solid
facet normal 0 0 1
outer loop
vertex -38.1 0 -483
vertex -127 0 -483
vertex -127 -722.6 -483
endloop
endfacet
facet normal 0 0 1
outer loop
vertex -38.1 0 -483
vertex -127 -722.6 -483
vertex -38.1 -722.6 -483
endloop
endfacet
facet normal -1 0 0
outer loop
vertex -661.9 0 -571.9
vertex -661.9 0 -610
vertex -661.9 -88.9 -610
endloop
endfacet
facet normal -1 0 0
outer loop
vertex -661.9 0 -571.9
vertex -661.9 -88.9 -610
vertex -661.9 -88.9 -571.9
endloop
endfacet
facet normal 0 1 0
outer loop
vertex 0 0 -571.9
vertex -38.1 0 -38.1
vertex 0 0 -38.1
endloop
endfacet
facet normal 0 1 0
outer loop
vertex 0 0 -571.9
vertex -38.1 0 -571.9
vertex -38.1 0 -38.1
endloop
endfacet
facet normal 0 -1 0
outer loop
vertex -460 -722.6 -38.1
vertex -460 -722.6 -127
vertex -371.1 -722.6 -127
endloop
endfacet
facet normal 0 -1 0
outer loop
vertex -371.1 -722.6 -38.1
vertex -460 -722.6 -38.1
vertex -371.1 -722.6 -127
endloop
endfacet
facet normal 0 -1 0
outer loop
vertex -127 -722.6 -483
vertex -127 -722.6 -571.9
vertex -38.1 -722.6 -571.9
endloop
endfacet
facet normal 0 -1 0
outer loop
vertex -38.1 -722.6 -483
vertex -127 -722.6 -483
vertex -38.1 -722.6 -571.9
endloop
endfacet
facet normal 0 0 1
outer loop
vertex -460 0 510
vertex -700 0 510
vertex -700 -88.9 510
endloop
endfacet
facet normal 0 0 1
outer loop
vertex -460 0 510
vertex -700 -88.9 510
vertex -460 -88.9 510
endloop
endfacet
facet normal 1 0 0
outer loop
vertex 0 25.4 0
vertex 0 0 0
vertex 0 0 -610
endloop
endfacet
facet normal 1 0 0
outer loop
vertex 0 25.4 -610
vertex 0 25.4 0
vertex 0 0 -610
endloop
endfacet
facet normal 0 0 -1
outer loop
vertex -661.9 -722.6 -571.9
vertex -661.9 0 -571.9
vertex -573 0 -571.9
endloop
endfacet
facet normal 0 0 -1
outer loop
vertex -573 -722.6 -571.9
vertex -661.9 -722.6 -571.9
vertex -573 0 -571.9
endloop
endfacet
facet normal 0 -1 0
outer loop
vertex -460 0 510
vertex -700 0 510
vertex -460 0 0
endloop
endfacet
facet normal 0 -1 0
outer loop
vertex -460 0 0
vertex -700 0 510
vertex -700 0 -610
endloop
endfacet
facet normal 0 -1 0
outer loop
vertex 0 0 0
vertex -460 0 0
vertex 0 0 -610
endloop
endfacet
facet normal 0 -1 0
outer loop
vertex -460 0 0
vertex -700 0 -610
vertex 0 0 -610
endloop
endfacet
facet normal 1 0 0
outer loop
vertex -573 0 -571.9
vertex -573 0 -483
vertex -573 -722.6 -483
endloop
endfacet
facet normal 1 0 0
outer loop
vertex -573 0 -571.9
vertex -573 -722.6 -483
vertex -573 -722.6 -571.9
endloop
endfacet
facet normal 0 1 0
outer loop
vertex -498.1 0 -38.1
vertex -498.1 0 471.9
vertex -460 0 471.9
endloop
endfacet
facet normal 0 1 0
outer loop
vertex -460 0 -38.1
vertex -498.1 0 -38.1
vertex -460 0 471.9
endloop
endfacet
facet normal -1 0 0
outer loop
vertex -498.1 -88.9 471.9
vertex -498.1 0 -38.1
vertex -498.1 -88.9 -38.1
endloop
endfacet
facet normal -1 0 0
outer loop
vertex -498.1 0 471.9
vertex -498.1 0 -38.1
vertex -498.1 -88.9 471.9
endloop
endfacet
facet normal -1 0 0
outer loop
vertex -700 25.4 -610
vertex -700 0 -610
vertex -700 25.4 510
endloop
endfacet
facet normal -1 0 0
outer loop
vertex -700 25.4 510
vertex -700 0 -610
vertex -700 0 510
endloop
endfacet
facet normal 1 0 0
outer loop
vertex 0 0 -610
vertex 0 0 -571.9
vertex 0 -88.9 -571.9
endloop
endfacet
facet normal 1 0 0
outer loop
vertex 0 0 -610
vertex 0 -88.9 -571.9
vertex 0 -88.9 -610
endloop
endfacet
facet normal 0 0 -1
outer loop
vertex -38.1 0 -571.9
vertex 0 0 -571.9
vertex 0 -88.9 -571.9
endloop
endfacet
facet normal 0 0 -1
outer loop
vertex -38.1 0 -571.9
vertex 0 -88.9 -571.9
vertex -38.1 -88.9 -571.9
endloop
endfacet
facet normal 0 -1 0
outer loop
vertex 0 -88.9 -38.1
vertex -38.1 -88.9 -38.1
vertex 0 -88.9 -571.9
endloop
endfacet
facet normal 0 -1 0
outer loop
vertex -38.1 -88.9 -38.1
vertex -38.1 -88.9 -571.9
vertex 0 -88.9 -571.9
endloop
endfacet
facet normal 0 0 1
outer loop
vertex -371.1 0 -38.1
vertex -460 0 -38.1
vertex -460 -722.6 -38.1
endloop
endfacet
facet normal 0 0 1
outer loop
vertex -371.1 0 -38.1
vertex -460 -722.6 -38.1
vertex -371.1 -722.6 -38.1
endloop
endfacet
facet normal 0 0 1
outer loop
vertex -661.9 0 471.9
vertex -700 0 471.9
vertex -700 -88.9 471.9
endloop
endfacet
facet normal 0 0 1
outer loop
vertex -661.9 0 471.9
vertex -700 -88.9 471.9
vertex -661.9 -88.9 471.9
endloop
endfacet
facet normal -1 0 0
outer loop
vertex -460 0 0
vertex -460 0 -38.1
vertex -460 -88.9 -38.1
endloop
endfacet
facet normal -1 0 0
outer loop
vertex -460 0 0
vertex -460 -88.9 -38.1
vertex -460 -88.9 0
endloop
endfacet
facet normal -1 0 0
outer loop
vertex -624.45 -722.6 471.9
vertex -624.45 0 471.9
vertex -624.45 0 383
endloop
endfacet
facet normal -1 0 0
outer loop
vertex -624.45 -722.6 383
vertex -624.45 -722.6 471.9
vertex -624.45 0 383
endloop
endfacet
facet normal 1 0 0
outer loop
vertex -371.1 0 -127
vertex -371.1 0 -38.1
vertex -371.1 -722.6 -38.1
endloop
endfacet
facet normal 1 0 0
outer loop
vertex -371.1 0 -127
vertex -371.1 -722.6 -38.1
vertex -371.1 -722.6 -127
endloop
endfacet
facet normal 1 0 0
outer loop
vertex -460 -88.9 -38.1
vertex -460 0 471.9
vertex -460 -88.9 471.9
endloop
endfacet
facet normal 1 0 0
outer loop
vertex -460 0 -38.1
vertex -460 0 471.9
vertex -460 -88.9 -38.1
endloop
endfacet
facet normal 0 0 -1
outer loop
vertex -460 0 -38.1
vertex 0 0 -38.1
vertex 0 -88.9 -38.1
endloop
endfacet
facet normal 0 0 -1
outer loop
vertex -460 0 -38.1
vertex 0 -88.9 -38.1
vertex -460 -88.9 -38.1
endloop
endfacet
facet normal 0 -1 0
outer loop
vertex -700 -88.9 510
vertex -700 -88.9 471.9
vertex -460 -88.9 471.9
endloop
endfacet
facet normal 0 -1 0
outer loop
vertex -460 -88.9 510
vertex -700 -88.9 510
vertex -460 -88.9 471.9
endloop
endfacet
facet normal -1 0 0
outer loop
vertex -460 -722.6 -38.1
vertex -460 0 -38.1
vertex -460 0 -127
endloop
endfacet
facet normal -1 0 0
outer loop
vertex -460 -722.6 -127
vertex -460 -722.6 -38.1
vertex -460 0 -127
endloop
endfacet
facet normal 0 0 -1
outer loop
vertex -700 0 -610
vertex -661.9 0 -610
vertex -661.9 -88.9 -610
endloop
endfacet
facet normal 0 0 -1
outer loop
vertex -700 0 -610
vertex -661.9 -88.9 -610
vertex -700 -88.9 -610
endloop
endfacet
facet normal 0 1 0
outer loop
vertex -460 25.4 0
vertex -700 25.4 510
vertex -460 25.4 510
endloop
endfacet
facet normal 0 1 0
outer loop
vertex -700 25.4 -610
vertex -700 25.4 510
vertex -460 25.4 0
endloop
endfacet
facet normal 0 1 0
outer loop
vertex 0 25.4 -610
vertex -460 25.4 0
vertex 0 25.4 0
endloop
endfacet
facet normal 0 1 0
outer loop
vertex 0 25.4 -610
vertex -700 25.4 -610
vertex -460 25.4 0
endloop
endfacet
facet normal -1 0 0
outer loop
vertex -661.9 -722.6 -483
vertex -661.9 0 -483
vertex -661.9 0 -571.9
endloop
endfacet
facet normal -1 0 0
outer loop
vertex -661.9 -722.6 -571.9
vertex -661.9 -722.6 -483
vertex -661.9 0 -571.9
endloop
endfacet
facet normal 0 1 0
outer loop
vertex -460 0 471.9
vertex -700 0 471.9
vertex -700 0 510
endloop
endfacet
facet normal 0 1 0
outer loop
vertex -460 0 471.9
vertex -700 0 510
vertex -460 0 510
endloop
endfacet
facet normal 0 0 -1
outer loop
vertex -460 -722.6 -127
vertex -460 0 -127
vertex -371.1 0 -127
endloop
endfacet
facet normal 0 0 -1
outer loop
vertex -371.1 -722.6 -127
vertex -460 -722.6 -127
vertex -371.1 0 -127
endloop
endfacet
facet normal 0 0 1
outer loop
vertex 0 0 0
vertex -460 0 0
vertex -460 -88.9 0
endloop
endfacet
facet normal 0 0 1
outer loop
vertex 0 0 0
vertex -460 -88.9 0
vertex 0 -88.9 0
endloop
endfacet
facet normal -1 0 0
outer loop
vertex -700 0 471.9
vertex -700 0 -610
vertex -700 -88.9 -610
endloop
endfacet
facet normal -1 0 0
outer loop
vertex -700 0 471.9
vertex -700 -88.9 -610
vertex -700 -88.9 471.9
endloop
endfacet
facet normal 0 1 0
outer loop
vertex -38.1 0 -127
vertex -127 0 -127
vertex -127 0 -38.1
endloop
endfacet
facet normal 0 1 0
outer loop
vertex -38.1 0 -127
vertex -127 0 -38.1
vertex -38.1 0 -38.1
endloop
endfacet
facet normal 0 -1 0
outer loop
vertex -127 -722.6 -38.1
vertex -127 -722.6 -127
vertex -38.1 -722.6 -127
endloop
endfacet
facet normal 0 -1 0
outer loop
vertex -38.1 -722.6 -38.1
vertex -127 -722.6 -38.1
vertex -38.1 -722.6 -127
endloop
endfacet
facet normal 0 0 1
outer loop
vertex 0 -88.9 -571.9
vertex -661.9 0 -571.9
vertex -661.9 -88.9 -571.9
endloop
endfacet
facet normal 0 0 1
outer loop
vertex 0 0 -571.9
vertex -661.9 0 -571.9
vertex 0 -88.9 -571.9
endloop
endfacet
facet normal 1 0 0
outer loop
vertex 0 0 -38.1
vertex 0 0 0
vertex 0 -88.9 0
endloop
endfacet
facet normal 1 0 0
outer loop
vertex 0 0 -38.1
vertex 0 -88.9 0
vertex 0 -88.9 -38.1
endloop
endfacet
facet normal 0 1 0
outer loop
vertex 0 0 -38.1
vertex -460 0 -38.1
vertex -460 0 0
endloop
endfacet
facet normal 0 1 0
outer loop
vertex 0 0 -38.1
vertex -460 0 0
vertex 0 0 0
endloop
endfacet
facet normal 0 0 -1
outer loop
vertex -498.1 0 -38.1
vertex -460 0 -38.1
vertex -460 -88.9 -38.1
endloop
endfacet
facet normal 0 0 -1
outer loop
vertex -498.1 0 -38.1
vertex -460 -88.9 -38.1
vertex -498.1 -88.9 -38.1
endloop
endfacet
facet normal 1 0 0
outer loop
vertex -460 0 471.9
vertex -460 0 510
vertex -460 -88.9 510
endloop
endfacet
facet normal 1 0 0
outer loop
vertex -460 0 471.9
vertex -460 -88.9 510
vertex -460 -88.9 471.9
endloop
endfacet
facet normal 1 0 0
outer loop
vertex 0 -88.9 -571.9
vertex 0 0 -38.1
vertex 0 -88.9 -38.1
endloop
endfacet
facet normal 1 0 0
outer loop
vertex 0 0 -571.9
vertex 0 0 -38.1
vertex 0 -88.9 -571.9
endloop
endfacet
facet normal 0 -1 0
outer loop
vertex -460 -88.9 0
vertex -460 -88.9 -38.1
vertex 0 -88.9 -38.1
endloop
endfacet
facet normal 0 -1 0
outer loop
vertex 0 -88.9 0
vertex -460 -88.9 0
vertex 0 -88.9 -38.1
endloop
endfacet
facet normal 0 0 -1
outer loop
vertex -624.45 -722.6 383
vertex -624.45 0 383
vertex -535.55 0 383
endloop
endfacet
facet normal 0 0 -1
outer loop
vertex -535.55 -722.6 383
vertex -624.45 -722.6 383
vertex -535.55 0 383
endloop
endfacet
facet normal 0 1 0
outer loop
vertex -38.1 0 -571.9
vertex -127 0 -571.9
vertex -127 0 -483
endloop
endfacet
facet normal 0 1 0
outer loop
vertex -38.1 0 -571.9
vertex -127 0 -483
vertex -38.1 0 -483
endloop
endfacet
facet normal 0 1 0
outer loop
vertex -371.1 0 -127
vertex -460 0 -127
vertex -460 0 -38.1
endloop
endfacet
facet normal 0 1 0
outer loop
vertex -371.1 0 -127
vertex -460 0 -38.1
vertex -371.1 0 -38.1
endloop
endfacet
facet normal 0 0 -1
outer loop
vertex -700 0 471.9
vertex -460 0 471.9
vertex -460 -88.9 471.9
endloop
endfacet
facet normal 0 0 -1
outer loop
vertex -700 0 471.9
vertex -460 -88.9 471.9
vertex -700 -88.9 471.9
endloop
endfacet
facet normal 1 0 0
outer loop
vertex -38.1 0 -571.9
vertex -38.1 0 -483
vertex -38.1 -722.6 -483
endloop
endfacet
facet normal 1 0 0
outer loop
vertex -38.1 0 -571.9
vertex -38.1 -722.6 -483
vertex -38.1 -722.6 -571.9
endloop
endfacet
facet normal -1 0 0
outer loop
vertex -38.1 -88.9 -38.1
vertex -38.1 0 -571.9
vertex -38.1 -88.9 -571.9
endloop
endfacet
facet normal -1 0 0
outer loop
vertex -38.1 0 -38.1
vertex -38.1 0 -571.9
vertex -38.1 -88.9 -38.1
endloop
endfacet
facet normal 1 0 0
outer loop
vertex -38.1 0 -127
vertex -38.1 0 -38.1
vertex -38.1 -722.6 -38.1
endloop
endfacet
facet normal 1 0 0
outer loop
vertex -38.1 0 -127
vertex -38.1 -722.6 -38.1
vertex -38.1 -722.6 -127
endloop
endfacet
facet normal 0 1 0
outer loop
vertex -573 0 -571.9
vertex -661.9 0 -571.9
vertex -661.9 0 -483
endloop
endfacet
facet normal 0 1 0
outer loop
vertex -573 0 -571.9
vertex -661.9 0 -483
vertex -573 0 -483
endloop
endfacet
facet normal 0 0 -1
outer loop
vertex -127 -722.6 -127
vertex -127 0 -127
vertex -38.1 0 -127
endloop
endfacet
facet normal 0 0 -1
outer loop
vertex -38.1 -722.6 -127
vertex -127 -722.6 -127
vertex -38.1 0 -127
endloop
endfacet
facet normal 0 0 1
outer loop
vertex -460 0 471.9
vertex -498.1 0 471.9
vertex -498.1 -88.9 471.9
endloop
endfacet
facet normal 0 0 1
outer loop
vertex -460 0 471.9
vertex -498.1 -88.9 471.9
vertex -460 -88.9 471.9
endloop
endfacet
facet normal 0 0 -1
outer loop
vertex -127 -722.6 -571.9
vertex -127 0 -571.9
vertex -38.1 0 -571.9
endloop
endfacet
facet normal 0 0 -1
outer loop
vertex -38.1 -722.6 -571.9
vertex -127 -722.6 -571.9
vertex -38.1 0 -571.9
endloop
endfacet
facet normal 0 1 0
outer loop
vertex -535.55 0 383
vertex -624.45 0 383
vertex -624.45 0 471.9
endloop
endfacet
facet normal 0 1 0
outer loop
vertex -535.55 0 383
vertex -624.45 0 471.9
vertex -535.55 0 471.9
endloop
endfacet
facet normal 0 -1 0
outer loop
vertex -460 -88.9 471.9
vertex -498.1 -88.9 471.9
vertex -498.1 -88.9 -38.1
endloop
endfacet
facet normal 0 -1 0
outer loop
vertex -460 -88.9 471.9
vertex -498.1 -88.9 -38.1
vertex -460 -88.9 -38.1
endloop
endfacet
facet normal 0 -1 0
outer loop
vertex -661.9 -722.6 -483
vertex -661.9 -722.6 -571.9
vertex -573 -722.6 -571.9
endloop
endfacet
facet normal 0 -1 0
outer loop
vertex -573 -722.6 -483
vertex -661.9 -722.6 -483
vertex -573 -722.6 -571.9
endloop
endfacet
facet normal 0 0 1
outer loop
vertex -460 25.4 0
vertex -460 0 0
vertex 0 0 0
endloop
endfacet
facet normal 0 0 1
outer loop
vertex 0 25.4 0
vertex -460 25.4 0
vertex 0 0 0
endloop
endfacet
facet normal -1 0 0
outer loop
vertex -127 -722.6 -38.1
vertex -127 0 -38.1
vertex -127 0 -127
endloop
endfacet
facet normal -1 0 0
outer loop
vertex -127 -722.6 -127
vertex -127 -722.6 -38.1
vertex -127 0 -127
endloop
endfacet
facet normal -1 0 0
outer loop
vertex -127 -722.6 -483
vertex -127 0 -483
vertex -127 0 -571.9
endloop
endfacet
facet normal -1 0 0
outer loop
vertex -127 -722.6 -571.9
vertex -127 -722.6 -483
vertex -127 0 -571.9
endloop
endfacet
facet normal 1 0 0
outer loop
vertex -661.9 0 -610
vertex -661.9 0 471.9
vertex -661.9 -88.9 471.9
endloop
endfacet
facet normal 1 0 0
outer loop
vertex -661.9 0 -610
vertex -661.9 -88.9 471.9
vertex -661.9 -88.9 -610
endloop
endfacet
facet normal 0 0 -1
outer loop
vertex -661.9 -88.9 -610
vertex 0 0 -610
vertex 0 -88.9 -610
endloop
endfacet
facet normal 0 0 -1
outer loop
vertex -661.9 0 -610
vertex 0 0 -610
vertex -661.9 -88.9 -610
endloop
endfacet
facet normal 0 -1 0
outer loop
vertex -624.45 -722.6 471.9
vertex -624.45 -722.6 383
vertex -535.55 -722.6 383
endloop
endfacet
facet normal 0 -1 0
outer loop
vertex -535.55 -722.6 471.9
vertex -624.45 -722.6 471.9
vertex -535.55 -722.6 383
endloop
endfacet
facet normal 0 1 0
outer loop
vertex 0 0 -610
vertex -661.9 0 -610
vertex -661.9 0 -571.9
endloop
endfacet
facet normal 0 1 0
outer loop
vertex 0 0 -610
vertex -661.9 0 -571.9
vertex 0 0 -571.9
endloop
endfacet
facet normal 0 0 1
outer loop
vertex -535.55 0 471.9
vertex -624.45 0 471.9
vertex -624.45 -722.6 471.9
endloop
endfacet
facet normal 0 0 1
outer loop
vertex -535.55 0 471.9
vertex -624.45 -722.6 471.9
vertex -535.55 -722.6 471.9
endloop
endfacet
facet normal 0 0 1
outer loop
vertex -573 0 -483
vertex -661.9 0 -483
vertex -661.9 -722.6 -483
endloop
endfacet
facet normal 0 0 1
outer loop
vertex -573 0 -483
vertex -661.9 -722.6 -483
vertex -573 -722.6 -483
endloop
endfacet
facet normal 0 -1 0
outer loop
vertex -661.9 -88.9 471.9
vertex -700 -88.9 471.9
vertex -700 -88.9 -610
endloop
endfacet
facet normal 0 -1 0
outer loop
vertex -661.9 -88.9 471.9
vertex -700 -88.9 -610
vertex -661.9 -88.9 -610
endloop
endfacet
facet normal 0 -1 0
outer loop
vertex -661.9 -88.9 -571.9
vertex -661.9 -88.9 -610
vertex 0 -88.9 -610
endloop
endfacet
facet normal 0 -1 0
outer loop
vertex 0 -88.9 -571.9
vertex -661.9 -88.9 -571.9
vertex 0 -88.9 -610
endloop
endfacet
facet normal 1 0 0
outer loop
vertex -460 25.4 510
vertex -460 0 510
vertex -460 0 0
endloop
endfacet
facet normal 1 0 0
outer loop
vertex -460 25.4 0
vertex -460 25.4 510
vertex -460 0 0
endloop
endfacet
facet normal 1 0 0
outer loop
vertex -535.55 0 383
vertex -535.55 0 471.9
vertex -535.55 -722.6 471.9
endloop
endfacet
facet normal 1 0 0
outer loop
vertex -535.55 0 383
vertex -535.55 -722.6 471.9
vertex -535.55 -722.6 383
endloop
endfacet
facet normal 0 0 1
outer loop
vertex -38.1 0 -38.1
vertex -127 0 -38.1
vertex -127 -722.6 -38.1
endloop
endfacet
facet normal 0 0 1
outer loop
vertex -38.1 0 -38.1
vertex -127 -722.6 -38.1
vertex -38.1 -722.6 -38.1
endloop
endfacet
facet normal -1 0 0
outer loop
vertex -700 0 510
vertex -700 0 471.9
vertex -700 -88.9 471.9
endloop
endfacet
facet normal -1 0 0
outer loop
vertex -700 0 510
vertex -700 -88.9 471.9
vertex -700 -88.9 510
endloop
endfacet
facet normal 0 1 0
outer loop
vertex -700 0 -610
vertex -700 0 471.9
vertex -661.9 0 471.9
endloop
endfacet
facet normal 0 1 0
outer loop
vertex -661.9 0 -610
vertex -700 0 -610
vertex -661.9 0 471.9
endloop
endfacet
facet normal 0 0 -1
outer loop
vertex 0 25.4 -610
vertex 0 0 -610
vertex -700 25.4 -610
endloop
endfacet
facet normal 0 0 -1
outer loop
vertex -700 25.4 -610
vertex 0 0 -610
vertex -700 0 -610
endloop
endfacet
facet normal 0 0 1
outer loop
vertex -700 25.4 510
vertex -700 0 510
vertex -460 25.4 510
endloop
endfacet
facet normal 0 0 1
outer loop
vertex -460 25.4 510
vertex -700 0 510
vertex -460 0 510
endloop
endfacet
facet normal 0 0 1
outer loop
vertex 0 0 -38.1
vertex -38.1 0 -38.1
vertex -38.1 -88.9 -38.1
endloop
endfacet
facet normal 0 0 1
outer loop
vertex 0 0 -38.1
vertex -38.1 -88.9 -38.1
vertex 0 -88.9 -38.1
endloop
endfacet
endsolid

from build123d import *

# Parameters (mm, degrees)
BOSS_EXTRUDE1_DEPTH   = 25.4
SKETCH1_3_W           = 88.9
SKETCH1_3_H           = 88.9
BOSS_EXTRUDE2_DEPTH   = 722.6
BOSS_EXTRUDE2_2_DEPTH = 722.6
BOSS_EXTRUDE2_3_DEPTH = 722.6
BOSS_EXTRUDE2_4_DEPTH = 722.6
BOSS_EXTRUDE2_5_DEPTH = 722.6
BOSS_EXTRUDE3_DEPTH   = 88.9
BOSS_EXTRUDE4_DEPTH   = 88.9
BOSS_EXTRUDE6_DEPTH   = 88.9
BOSS_EXTRUDE7_DEPTH   = 88.9
BOSS_EXTRUDE8_DEPTH   = 88.9
BOSS_EXTRUDE9_DEPTH   = 88.9


with BuildPart() as part:
    # Sketch1 → Boss-Extrude1 (new body)
    with BuildSketch(Plane(origin=(0, 0, 0), x_dir=(1, 0, 0), z_dir=(0, 1, 0))):
        Polygon((-700, -510), (-460, -510), (-460, 0), (0, 0), (0, 610), (-700, 610), align=None)
    extrude(amount=BOSS_EXTRUDE1_DEPTH)


with BuildPart() as body_2:
    # Sketch1<3> → Boss-Extrude2 (new body)
    with BuildSketch(Plane(origin=(0, 0, 0), x_dir=(1, 0, 0), z_dir=(0, 1, 0))):
        with Locations((-580, -427.45)):
            Rectangle(SKETCH1_3_W, SKETCH1_3_H)
    extrude(amount=-BOSS_EXTRUDE2_DEPTH)


with BuildPart() as body_3:
    # Sketch1<3> → Boss-Extrude2 2 (new body)
    with BuildSketch(Plane(origin=(0, 0, 0), x_dir=(1, 0, 0), z_dir=(0, 1, 0))):
        with Locations((-415.55, 82.55)):
            Rectangle(SKETCH1_3_W, SKETCH1_3_H)
    extrude(amount=-BOSS_EXTRUDE2_2_DEPTH)


with BuildPart() as body_4:
    # Sketch1<3> → Boss-Extrude2 3 (new body)
    with BuildSketch(Plane(origin=(0, 0, 0), x_dir=(1, 0, 0), z_dir=(0, 1, 0))):
        with Locations((-82.55, 82.55)):
            Rectangle(SKETCH1_3_W, SKETCH1_3_H)
    extrude(amount=-BOSS_EXTRUDE2_3_DEPTH)


with BuildPart() as body_5:
    # Sketch1<3> → Boss-Extrude2 4 (new body)
    with BuildSketch(Plane(origin=(0, 0, 0), x_dir=(1, 0, 0), z_dir=(0, 1, 0))):
        with Locations((-82.55, 527.45)):
            Rectangle(SKETCH1_3_W, SKETCH1_3_H)
    extrude(amount=-BOSS_EXTRUDE2_4_DEPTH)


with BuildPart() as body_6:
    # Sketch1<3> → Boss-Extrude2 5 (new body)
    with BuildSketch(Plane(origin=(0, 0, 0), x_dir=(1, 0, 0), z_dir=(0, 1, 0))):
        with Locations((-617.45, 527.45)):
            Rectangle(SKETCH1_3_W, SKETCH1_3_H)
    extrude(amount=-BOSS_EXTRUDE2_5_DEPTH)


with BuildPart() as body_7:
    # Sketch1<4> → Boss-Extrude3 (new body)
    with BuildSketch(Plane(origin=(0, 0, 0), x_dir=(1, 0, 0), z_dir=(0, 1, 0))):
        Polygon((-460, 38.1), (-460, 0), (0, 0), (0, 38.1), (-38.1, 38.1), (-127, 38.1), (-371.1, 38.1), align=None)
    extrude(amount=-BOSS_EXTRUDE3_DEPTH)


with BuildPart() as body_8:
    # Sketch1<5> → Boss-Extrude4 (new body)
    with BuildSketch(Plane(origin=(0, 0, 0), x_dir=(1, 0, 0), z_dir=(0, 1, 0))):
        Polygon((-498.1, -471.9), (-460, -471.9), (-460, 0), (-460, 38.1), (-498.1, 38.1), align=None)
    extrude(amount=-BOSS_EXTRUDE4_DEPTH)


with BuildPart() as body_9:
    # Sketch1<6> → Boss-Extrude6 (new body)
    with BuildSketch(Plane(origin=(0, 0, 0), x_dir=(1, 0, 0), z_dir=(0, 1, 0))):
        Polygon((-700, -471.9), (-700, -510), (-460, -510), (-460, -471.9), (-498.1, -471.9), (-535.55, -471.9), (-624.45, -471.9), (-661.9, -471.9), align=None)
    extrude(amount=-BOSS_EXTRUDE6_DEPTH)


with BuildPart() as body_10:
    # Sketch1<7> → Boss-Extrude7 (new body)
    with BuildSketch(Plane(origin=(0, 0, 0), x_dir=(1, 0, 0), z_dir=(0, 1, 0))):
        Polygon((-700, 610), (-700, -471.9), (-661.9, -471.9), (-661.9, 483), (-661.9, 571.9), (-661.9, 610), align=None)
    extrude(amount=-BOSS_EXTRUDE7_DEPTH)


with BuildPart() as body_11:
    # Sketch1<8> → Boss-Extrude8 (new body)
    with BuildSketch(Plane(origin=(0, 0, 0), x_dir=(1, 0, 0), z_dir=(0, 1, 0))):
        Polygon((0, 610), (-661.9, 610), (-661.9, 571.9), (-573, 571.9), (-127, 571.9), (-38.1, 571.9), (0, 571.9), align=None)
    extrude(amount=-BOSS_EXTRUDE8_DEPTH)


with BuildPart() as body_12:
    # Sketch1<9> → Boss-Extrude9 (new body)
    with BuildSketch(Plane(origin=(0, 0, 0), x_dir=(1, 0, 0), z_dir=(0, 1, 0))):
        Polygon((-38.1, 38.1), (0, 38.1), (0, 571.9), (-38.1, 571.9), (-38.1, 483), (-38.1, 127), align=None)
    extrude(amount=-BOSS_EXTRUDE9_DEPTH)


solid = Compound([part.part, body_2.part, body_3.part, body_4.part, body_5.part, body_6.part, body_7.part, body_8.part, body_9.part, body_10.part, body_11.part, body_12.part])
